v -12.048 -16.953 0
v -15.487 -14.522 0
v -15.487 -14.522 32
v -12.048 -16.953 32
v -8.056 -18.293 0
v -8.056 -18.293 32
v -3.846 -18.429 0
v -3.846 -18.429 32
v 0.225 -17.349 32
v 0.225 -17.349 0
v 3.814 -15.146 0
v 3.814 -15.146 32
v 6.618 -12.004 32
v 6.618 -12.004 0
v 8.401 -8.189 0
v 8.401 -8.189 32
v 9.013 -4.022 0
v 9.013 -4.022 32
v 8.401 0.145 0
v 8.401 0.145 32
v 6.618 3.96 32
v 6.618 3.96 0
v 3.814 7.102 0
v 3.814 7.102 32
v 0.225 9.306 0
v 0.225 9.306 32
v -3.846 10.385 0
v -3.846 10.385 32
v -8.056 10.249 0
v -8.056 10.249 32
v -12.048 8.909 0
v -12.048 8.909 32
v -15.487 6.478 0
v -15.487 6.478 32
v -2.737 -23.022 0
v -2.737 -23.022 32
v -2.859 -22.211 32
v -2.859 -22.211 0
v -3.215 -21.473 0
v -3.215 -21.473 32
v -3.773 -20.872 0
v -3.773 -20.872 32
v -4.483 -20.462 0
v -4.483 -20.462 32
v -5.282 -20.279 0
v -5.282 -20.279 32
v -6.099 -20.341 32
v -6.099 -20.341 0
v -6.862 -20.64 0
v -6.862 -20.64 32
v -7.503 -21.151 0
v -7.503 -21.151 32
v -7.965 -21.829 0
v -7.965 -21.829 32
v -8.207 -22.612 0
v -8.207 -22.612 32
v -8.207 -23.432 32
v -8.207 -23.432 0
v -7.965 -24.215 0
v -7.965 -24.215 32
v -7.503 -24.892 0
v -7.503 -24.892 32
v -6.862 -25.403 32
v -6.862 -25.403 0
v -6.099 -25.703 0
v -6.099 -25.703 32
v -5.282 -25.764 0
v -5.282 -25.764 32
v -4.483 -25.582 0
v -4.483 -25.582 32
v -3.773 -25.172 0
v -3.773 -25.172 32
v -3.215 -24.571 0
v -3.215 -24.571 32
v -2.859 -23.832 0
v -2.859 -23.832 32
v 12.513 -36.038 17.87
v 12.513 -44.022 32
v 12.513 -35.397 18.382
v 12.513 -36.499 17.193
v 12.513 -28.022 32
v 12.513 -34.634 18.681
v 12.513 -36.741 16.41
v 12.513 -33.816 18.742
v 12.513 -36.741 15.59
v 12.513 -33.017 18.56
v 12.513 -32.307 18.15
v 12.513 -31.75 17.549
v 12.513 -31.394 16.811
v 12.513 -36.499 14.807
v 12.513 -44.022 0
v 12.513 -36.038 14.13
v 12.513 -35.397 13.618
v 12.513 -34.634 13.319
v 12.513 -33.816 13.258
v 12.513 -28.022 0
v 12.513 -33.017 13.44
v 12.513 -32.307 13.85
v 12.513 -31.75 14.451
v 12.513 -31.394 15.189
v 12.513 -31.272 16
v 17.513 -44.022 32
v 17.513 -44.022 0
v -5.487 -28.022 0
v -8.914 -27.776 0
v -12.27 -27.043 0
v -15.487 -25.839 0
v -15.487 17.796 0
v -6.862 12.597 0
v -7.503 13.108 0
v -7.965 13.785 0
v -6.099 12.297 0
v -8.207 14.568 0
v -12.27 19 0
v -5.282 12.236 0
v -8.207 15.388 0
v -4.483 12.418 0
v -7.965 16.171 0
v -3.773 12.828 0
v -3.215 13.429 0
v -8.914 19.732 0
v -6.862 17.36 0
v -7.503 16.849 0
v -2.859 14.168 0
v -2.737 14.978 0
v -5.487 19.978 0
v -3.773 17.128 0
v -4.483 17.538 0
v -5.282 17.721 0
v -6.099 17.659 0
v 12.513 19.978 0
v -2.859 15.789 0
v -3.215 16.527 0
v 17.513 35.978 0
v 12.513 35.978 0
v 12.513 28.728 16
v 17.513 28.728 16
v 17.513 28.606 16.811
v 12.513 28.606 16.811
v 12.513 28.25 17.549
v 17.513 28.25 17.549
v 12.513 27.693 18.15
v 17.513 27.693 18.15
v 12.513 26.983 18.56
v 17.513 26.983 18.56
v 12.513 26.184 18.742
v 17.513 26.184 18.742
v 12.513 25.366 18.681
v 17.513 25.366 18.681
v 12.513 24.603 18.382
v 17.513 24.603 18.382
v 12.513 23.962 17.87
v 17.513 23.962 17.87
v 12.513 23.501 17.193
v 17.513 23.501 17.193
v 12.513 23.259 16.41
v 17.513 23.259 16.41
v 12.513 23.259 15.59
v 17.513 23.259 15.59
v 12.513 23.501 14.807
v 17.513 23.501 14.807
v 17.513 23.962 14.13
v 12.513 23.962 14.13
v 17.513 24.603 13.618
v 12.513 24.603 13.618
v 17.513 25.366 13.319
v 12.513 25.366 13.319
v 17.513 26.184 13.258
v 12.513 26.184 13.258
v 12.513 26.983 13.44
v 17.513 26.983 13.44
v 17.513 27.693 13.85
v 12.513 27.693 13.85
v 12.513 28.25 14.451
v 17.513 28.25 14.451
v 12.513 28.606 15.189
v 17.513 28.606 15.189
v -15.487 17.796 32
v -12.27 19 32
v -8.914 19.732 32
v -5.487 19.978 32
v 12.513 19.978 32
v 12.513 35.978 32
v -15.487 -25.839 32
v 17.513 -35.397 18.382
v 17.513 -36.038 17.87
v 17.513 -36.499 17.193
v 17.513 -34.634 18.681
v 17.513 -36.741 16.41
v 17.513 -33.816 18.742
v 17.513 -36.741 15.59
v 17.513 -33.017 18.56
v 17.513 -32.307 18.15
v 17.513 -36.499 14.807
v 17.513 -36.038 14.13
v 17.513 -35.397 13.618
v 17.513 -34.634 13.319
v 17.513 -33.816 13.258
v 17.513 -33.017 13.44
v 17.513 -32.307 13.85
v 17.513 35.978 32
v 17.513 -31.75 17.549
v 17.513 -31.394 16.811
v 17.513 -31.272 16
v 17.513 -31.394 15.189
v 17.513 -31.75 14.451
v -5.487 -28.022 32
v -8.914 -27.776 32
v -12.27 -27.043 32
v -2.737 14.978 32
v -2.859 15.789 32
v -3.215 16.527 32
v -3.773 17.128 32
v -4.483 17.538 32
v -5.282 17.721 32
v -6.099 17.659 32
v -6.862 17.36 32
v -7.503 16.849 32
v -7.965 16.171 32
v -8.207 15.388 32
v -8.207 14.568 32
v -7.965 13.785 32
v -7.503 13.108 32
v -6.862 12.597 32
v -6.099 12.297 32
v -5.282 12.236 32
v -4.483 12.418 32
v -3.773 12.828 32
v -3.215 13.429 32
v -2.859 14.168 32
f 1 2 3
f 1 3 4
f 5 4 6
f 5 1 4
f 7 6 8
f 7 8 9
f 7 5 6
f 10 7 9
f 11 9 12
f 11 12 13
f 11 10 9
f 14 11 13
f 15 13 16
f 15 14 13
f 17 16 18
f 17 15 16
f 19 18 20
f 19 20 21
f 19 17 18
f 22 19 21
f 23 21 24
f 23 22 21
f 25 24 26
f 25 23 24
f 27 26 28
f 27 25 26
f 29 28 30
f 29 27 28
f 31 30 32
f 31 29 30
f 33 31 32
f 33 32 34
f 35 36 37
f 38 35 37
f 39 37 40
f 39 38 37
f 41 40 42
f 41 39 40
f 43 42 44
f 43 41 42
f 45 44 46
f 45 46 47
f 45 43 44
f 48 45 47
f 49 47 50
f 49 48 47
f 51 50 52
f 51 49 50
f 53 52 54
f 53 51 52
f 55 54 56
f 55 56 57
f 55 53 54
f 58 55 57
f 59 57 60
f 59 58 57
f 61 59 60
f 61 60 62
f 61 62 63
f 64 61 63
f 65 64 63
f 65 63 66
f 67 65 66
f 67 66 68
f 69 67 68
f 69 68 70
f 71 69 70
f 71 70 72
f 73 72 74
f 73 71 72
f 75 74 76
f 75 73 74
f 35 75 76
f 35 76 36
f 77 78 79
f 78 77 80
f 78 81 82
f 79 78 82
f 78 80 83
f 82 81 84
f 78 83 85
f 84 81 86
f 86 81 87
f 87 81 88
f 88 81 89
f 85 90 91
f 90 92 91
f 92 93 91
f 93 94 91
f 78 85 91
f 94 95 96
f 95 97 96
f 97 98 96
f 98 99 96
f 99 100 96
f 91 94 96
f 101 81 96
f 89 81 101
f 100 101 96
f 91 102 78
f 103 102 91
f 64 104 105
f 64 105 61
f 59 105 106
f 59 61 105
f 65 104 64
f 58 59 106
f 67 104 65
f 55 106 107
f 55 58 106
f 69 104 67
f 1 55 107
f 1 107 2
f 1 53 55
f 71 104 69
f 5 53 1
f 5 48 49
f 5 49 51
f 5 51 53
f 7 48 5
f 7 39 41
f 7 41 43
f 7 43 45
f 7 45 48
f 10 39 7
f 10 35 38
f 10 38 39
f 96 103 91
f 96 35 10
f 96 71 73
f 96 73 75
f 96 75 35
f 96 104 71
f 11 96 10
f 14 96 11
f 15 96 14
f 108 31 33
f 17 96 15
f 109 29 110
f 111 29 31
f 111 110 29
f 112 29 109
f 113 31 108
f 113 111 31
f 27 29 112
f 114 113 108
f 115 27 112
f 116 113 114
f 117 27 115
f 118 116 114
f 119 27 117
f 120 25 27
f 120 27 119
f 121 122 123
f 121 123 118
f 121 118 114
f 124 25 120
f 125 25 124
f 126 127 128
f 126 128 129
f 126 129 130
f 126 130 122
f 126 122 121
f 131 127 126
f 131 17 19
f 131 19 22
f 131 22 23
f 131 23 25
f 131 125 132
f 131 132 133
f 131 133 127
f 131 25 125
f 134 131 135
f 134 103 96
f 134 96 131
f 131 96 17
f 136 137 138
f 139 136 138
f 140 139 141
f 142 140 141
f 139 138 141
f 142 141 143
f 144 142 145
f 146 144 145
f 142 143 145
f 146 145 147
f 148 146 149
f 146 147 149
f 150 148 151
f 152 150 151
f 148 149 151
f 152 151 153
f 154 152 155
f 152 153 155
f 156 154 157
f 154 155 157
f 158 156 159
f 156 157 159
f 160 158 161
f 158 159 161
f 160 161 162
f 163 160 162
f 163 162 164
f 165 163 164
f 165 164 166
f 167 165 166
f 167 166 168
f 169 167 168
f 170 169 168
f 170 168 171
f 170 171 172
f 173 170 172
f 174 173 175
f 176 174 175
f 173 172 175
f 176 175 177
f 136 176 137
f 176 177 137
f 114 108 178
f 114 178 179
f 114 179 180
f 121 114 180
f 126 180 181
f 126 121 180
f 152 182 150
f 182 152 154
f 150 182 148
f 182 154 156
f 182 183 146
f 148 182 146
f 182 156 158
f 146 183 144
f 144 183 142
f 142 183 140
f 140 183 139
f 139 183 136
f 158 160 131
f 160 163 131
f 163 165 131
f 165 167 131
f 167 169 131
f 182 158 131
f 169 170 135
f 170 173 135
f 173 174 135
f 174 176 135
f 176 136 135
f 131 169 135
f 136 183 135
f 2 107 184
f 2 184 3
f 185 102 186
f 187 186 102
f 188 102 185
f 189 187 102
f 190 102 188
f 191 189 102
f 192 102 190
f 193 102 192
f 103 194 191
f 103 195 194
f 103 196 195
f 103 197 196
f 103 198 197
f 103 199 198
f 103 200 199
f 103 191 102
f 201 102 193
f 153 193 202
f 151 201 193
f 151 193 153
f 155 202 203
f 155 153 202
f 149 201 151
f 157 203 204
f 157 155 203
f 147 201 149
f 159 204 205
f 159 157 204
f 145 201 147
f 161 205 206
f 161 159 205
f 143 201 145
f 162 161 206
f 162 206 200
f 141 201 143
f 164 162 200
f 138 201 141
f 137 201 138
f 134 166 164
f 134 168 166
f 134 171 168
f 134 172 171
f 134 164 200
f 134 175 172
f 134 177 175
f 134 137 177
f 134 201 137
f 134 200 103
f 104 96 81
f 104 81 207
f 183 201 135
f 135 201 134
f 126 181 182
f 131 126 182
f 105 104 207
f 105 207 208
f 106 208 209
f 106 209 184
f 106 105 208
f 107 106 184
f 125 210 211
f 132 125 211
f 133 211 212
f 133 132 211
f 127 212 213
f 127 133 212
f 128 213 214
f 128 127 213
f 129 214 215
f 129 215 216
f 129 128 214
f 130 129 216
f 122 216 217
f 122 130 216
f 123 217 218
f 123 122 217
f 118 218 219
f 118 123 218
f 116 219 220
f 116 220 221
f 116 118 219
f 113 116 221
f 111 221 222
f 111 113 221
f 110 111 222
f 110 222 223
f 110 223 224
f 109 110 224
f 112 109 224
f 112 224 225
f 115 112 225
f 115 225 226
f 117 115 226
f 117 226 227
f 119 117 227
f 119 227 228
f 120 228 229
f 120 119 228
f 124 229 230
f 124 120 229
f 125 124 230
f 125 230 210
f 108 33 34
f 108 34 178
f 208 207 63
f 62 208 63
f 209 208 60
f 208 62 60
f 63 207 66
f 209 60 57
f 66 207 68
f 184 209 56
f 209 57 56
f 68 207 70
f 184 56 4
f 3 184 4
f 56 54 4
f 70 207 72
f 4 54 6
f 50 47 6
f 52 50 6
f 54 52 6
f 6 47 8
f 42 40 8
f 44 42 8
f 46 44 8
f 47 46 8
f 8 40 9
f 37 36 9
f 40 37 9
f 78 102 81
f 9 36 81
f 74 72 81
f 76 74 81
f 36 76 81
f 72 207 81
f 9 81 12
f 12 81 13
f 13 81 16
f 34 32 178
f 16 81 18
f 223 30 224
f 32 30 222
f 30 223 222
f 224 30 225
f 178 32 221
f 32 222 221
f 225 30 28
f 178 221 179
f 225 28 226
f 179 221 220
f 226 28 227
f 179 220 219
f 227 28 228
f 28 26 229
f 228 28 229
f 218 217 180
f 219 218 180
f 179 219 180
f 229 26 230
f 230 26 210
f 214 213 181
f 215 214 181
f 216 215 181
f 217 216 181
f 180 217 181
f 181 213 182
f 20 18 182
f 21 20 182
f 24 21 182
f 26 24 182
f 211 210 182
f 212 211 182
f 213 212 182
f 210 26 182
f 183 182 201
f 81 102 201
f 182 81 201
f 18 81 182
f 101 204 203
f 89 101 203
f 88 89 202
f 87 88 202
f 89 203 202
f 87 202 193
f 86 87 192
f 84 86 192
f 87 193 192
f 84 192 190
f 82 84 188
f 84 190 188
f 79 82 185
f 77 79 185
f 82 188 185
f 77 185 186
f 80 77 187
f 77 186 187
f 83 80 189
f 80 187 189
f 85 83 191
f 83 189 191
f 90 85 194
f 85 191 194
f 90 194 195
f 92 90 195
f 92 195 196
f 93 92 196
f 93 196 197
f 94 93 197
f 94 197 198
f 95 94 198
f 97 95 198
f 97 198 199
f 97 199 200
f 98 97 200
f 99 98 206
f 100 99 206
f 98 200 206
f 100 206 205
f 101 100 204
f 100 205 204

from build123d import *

# Parameters (mm, degrees)
ESQUISSE2_R        = 2.75
BOSS_EXTRU_1_DEPTH = 32
ESQUISSE3_W        = 32
ESQUISSE3_H        = 16
ESQUISSE3_R        = 2.75
BOSS_EXTRU_2_DEPTH = 5


with BuildPart() as part:
    # Esquisse2 → Boss.-Extru.1 (new body)
    with BuildSketch(Plane.XY):
        with BuildLine():
            Line((-5.48727754, 19.978225401), (17.51272246, 19.978225401))
            Line((17.51272246, 19.978225401), (17.51272246, -28.021774599))
            Line((17.51272246, -28.021774599), (-5.48727754, -28.021774599))
            ThreePointArc((-5.48727754, -28.021774599), (-10.604983007, -27.469782846), (-15.48727754, -25.839198829))
            Line((-15.48727754, -25.839198829), (-15.48727754, -14.521774599))
            ThreePointArc((-15.48727754, -14.521774599), (9.01272246, -4.021774599), (-15.48727754, 6.478225401))
            Line((-15.48727754, 6.478225401), (-15.48727754, 17.79564963))
            ThreePointArc((-15.48727754, 17.79564963), (-10.604983007, 19.426233648), (-5.48727754, 19.978225401))
        make_face()
        with Locations((-5.48727754, 14.978225401)):
            Circle(ESQUISSE2_R, mode=Mode.SUBTRACT)
        with Locations((-5.48727754, -23.021774599)):
            Circle(ESQUISSE2_R, mode=Mode.SUBTRACT)
    extrude(amount=BOSS_EXTRU_1_DEPTH)

    # Esquisse3 → Boss.-Extru.2 (add)
    # profile 1 of 2: a face of its own
    with BuildSketch(Plane(origin=(17.51272246, 0, 0), x_dir=(0, 0, -1), z_dir=(1, 0, 0))):
        with Locations((-16, 27.978225401)):
            Rectangle(ESQUISSE3_W, ESQUISSE3_H)
        with Locations(Location((-16, 25.978225401, 0), (0, 0, 90))):
            Circle(ESQUISSE3_R, mode=Mode.SUBTRACT)
    # profile 2 of 2: a face of its own
    with BuildSketch(Plane(origin=(17.51272246, 0, 0), x_dir=(0, 0, -1), z_dir=(1, 0, 0))):
        with Locations((-16, -36.021774599)):
            Rectangle(ESQUISSE3_W, ESQUISSE3_H)
        with Locations(Location((-16, -34.021774599, 0), (0, 0, 90))):
            Circle(ESQUISSE3_R, mode=Mode.SUBTRACT)
    extrude(amount=-BOSS_EXTRU_2_DEPTH)


solid = part.part
